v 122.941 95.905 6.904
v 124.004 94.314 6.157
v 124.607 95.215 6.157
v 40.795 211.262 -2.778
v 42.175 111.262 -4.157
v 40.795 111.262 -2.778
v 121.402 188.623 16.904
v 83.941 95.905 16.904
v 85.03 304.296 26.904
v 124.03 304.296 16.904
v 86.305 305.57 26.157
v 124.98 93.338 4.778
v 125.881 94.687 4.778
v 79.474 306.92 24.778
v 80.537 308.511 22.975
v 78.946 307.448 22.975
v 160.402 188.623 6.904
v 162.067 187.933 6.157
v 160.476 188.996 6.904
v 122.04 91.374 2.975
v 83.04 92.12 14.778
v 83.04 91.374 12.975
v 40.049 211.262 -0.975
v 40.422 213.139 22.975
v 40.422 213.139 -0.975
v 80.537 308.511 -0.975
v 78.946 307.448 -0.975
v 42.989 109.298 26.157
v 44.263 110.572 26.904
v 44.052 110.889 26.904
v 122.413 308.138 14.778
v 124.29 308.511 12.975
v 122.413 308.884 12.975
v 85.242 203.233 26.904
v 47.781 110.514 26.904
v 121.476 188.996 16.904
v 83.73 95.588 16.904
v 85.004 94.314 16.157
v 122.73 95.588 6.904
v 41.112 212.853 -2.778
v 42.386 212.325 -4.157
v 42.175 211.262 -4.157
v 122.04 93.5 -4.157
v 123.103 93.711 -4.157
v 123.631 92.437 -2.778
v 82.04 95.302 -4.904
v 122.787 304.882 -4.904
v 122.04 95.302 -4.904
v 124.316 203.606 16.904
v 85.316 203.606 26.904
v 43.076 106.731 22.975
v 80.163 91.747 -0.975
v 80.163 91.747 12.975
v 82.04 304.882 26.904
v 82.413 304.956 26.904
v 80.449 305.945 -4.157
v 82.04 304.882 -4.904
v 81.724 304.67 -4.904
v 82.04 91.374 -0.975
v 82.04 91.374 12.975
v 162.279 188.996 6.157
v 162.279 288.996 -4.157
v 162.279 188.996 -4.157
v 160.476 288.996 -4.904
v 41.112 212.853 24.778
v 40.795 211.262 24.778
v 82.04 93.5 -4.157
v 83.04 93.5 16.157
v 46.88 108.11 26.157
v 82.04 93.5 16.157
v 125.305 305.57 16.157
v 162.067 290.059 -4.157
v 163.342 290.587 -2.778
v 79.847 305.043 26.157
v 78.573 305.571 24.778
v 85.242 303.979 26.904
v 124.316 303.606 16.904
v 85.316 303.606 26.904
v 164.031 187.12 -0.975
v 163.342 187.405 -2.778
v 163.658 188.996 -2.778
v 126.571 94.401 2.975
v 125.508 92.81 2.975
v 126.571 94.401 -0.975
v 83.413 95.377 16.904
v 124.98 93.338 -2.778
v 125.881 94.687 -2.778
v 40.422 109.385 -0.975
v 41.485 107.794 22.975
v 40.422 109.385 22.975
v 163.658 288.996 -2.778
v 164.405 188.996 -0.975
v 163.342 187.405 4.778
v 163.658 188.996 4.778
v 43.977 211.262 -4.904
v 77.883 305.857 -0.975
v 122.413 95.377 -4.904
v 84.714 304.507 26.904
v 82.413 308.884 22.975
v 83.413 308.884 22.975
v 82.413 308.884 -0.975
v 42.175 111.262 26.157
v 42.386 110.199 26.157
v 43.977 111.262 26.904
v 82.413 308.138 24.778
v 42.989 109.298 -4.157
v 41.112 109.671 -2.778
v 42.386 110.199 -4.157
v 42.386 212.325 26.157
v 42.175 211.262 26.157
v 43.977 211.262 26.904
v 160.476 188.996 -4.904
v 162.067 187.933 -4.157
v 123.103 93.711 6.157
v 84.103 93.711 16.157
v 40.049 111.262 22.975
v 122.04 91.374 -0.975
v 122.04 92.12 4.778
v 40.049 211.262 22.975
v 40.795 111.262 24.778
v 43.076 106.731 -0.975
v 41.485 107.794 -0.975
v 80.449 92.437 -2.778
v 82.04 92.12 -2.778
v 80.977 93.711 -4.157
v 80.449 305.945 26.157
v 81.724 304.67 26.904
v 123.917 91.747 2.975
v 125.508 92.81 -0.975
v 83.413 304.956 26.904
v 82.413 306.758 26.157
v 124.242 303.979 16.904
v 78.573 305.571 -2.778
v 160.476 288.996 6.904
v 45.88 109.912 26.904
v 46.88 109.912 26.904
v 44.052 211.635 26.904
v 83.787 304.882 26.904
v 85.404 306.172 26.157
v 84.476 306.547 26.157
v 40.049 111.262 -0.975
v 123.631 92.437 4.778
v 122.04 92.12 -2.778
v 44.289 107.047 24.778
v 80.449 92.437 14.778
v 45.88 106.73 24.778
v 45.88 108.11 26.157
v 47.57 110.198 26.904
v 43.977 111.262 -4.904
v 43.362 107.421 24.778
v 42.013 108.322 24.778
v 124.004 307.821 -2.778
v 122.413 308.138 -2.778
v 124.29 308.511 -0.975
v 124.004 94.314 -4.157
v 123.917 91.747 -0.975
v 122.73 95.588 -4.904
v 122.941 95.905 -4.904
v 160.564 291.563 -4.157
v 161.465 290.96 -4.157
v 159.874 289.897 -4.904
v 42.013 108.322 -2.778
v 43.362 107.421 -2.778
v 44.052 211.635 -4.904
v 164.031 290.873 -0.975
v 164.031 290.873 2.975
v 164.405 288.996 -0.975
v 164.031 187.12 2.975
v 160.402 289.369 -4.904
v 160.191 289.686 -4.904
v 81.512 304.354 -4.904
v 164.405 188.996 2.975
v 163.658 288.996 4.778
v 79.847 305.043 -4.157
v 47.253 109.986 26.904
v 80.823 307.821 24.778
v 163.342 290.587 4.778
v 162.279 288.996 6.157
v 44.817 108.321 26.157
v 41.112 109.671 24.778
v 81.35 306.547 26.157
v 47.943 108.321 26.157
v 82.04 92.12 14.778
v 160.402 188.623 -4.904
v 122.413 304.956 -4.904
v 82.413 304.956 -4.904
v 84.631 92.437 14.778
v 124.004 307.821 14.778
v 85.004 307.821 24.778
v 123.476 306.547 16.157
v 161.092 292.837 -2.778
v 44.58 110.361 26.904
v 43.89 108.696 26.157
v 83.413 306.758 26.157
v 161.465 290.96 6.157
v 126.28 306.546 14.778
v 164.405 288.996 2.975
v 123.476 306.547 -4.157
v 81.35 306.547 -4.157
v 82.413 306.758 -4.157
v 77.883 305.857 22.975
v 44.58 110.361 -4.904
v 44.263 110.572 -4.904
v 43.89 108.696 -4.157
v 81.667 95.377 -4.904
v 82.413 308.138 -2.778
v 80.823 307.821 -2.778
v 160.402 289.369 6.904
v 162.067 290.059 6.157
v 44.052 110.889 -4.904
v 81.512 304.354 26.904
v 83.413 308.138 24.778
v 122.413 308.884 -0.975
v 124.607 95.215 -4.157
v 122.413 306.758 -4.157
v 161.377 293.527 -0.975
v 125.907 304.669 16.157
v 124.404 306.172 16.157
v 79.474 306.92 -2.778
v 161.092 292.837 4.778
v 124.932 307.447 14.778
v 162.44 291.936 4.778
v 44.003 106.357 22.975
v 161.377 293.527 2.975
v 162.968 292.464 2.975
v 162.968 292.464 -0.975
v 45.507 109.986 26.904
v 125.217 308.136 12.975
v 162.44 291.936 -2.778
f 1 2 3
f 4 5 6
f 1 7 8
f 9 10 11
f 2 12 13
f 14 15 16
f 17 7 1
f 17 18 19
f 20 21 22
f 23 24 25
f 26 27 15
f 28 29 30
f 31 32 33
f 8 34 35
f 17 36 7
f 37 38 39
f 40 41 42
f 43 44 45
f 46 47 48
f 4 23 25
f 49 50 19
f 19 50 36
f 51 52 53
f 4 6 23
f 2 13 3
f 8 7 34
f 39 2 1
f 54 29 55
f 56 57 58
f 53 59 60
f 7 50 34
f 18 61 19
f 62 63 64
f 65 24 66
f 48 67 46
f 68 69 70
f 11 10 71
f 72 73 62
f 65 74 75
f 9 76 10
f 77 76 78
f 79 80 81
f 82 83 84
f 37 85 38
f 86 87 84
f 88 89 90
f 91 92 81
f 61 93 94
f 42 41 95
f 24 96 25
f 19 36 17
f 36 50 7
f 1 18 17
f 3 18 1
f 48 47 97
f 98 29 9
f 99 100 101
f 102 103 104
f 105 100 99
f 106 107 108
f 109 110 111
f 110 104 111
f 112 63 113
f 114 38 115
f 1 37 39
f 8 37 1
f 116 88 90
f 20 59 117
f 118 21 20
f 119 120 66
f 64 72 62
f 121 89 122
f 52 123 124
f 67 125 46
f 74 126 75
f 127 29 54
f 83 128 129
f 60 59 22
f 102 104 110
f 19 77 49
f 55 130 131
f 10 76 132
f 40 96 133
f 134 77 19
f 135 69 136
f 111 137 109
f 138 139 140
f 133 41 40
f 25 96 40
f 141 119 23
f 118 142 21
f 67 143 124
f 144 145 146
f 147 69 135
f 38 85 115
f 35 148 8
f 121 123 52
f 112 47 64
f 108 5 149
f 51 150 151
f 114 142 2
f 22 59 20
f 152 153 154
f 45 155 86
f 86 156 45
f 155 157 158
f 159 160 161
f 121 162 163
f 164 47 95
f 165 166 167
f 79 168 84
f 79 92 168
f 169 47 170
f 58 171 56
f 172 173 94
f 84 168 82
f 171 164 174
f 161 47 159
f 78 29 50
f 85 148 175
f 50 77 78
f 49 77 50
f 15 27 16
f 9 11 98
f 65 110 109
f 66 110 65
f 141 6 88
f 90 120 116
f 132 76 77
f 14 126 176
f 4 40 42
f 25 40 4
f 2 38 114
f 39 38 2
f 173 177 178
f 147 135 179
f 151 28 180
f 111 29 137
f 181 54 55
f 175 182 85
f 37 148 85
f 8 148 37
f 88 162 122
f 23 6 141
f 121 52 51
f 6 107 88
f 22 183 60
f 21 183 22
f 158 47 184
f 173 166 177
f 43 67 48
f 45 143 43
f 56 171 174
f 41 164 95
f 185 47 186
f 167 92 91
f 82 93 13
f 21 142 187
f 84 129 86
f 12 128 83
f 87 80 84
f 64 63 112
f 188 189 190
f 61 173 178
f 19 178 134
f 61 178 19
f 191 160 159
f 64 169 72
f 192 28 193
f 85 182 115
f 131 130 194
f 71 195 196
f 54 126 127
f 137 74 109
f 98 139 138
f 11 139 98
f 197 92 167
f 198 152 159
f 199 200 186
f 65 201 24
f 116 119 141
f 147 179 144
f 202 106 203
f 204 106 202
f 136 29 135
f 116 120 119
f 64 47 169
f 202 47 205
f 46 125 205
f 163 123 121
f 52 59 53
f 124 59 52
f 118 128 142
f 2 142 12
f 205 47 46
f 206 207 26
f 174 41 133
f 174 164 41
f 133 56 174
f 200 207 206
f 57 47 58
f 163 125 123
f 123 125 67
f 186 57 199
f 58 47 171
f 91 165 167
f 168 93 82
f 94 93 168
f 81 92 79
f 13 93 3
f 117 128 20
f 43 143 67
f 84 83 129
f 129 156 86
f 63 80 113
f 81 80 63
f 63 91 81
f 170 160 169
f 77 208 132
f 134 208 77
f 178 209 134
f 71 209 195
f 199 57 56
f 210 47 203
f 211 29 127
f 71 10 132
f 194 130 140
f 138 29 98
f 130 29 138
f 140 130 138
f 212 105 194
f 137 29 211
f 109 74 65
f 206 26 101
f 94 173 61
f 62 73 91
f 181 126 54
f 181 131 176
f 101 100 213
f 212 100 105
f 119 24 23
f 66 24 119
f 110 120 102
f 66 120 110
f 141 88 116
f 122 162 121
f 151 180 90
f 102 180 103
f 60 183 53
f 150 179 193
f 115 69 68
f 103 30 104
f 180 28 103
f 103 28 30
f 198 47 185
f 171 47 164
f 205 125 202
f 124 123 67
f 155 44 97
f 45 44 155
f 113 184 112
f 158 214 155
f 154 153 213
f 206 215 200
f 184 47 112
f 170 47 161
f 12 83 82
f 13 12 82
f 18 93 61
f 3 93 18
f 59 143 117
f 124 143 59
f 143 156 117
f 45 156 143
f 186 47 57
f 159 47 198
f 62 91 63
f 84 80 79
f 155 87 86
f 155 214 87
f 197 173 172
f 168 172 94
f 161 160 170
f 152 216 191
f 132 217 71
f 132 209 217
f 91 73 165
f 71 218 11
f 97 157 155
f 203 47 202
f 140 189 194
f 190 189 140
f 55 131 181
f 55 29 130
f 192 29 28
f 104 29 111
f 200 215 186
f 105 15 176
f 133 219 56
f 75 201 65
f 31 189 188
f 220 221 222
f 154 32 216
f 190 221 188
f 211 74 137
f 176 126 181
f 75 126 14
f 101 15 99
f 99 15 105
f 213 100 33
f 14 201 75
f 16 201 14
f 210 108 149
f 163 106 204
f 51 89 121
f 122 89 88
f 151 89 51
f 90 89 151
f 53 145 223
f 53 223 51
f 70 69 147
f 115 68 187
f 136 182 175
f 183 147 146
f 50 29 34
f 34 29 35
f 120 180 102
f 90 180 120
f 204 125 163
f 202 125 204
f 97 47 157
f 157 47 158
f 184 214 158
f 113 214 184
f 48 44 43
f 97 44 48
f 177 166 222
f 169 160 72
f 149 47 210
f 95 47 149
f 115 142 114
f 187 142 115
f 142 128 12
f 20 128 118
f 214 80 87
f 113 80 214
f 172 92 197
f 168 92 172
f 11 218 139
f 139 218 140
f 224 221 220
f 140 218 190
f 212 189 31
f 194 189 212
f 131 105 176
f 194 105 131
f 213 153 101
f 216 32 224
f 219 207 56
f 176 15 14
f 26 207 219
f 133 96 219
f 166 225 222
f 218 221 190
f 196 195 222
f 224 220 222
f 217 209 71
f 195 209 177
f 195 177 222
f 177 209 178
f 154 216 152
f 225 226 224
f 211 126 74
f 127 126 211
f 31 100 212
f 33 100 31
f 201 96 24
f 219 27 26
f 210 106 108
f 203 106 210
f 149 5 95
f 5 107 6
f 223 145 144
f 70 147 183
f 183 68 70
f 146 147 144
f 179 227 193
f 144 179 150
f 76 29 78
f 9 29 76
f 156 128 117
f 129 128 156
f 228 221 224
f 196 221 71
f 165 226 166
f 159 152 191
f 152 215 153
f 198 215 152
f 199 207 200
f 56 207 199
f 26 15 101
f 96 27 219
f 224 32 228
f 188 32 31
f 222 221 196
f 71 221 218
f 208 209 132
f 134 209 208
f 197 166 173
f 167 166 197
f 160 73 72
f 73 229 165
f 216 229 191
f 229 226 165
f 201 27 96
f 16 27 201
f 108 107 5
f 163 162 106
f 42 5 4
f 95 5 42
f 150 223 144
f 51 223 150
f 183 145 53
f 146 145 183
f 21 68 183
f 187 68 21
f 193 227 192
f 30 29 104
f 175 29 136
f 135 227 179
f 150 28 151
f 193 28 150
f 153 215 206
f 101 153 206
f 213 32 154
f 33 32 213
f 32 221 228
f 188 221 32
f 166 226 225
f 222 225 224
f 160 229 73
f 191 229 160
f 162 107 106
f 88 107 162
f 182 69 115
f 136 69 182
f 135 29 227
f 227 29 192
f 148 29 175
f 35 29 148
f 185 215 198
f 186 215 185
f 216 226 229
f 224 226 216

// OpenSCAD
s = 10;
rf = 0.5*s;
aj = 22;

lb = 10*s;
ls = 5*s;

db = 4*s;
ds = db;

dbt = 0.1*s;
dbs = dbt;

hb = 0.1*s;
hs = hb;

hbt = 1*s;
hst = hbt;

module wedge(db,lb,hb,dt,lt,ht) {
    hull() {
        cube([db, lb, hb]);
        translate([0, 0, hb]) cube([dt, lt, ht]);
    }
}

minkowski() {
    wedge(db, lb, hb, dbt, lb, hbt);
    rotate(-aj) translate([0, db/2+lb, 0]) wedge(db, lb, hb, dbt, lb, hbt);
    sphere(r=rf);
}
